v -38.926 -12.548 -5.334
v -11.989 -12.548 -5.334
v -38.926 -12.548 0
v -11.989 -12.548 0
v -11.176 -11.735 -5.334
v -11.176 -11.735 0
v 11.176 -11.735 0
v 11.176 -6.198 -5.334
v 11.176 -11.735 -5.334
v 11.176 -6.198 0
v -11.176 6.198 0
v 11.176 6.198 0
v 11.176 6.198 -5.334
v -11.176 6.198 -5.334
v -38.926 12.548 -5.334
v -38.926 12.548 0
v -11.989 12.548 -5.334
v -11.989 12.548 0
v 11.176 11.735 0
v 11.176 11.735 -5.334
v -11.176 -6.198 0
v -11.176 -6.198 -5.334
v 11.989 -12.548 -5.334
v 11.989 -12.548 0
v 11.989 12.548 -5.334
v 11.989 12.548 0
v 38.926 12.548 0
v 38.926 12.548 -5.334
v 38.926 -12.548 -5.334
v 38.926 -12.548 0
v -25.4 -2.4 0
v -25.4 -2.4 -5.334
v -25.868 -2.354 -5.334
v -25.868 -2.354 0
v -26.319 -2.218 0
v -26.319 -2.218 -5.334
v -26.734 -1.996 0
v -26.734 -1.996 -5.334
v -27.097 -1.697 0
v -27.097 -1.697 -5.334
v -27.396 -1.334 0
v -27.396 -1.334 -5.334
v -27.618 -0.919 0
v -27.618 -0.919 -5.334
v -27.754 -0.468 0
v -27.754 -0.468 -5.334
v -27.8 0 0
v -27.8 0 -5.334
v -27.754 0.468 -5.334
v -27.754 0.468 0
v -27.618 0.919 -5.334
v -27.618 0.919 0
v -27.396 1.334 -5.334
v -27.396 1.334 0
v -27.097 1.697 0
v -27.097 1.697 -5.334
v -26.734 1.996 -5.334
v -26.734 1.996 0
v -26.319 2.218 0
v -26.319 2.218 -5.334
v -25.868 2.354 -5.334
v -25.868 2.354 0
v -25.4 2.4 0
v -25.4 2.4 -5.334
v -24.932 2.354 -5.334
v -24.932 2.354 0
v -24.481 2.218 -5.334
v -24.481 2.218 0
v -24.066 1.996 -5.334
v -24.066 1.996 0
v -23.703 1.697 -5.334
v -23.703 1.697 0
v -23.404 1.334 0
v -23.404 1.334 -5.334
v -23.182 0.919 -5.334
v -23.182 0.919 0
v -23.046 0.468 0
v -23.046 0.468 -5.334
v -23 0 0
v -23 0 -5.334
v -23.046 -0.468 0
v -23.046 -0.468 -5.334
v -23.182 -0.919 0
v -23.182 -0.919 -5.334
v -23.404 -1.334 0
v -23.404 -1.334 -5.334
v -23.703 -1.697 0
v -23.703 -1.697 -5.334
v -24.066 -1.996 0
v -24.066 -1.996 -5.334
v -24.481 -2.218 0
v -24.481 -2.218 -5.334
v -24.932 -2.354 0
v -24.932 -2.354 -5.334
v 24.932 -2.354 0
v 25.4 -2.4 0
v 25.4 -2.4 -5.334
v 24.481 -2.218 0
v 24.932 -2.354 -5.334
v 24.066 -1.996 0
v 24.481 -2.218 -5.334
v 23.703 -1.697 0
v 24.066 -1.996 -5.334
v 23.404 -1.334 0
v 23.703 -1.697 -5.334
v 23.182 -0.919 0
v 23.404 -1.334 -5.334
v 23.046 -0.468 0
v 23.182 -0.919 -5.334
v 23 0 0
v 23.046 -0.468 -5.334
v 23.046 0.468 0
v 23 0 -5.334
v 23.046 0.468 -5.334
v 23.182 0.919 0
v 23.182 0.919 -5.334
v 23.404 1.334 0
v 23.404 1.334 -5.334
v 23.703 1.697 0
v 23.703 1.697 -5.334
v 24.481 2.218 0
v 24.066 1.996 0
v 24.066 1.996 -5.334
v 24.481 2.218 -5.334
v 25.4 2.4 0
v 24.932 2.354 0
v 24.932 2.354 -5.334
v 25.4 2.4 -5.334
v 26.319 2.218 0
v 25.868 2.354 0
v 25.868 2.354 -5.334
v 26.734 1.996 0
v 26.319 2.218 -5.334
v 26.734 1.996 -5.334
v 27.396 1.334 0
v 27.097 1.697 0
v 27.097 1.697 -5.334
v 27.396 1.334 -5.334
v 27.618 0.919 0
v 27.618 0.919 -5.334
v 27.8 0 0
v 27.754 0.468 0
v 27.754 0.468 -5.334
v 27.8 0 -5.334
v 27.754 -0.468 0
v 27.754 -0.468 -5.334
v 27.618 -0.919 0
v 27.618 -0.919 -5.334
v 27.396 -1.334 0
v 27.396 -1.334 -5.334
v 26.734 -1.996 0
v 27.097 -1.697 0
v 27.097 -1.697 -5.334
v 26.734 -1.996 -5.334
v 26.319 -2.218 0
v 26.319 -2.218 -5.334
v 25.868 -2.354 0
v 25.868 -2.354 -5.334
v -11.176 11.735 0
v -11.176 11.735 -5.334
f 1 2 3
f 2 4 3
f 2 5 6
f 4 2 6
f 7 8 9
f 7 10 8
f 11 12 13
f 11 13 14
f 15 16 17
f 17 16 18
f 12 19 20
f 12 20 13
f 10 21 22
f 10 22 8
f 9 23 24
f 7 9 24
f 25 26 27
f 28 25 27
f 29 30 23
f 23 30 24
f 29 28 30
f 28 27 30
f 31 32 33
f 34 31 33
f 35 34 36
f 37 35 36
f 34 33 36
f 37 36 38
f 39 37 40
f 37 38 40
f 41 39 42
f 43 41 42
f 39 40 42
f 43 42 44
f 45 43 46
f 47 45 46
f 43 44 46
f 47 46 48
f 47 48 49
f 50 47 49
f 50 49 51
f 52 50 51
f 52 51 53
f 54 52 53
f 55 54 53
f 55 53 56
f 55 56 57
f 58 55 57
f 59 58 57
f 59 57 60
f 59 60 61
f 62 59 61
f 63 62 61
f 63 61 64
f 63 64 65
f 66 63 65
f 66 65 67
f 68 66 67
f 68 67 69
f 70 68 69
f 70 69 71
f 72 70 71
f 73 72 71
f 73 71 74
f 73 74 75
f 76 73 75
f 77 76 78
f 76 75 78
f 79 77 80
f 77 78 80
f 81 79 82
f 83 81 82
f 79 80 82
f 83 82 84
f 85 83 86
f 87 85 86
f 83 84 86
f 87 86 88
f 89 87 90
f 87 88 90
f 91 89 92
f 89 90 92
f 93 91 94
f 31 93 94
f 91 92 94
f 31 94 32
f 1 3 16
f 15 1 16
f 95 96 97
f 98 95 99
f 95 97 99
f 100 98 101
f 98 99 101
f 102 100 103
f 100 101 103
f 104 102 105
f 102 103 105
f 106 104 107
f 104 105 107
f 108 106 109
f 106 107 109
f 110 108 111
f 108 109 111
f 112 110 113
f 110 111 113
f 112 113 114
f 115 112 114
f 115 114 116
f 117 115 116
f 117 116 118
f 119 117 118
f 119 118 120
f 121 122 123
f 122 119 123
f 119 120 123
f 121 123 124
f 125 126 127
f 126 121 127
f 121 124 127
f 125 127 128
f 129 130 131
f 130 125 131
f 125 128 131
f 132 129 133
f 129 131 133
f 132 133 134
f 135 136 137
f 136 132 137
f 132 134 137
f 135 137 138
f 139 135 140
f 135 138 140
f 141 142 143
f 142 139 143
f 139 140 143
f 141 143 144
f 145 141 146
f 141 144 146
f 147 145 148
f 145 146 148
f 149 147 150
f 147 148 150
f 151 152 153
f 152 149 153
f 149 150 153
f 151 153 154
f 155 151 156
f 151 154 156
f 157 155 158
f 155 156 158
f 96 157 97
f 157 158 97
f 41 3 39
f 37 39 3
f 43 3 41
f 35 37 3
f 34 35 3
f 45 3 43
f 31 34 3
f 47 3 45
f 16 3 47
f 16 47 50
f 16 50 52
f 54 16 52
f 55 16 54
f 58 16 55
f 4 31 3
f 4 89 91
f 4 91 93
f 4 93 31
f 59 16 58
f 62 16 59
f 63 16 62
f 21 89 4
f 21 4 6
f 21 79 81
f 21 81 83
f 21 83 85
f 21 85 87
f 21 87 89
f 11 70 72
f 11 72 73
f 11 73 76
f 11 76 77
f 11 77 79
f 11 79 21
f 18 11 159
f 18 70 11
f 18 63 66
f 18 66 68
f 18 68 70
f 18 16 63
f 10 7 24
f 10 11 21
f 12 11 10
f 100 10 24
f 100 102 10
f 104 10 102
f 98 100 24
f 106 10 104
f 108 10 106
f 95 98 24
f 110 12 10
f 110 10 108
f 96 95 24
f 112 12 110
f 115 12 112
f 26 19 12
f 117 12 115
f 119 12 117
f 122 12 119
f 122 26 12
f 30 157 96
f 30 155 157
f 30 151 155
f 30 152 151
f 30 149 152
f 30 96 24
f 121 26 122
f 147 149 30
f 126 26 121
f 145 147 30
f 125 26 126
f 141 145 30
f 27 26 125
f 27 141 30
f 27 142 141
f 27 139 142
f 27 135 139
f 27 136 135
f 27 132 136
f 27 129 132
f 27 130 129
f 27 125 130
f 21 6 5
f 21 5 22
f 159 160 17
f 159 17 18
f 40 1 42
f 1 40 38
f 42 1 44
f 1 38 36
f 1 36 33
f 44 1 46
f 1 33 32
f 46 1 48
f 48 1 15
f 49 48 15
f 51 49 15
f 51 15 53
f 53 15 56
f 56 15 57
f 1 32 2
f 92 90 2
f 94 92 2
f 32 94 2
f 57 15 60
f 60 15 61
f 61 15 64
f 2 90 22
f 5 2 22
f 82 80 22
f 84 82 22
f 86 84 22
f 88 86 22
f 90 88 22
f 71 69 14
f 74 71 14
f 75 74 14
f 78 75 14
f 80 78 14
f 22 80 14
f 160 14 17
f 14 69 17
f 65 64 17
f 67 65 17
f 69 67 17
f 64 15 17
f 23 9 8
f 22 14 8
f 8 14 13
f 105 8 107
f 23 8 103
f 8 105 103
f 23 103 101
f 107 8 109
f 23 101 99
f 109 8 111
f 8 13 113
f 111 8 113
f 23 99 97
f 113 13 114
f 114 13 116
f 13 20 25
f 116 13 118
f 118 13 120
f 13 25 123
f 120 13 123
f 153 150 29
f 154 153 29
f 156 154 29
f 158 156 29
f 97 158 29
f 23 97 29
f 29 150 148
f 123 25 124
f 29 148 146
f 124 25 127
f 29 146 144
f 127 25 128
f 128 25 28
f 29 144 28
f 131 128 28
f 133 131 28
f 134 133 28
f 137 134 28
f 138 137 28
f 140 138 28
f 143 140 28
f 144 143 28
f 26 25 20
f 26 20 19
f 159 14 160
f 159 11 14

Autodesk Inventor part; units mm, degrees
ref_plane "YZ Plane" through (0, 0, 0) normal (1, 0, 0) x (0, 1, 0)
ref_plane "XZ Plane" through (0, 0, 0) normal (0, 1, 0) x (-1, 0, 0)
ref_plane "XY Plane" through (0, 0, 0) normal (0, 0, 1) x (1, 0, 0)
sketch "Sketch1" plane through (0, 0, 0) normal (0, 0, 1) x (1, 0, 0)
  line L0 (-38.9255, 12.5476) -> (38.9255, 12.5476)
  line L1 (38.9255, 12.5476) -> (38.9255, -12.5476)
  line L2 (38.9255, -12.5476) -> (-38.9255, -12.5476)
  line L3 (-38.9255, -12.5476) -> (-38.9255, 12.5476)
  point P0 (0, 0)
  point P1 (38.9255, 0)
  point P2 (0, 12.5476)
  dimension "d0" = 77.851
  dimension "d1" = 25.0952
extrude "Extrusion1" add sketch "Sketch1" against normal blind 5.334
sketch "Sketch2" plane through (0, 0, 0) normal (0, 0, 1) x (1, 0, 0)
  line L0 (-38.9255, 12.5476) -> (38.9255, 12.5476) projected
  line L1 (38.9255, -12.5476) -> (-38.9255, -12.5476) projected
  line L2 (-11.176, -6.1976) -> (11.176, -6.1976)
  line L3 (11.176, -6.1976) -> (11.176, -12.5476)
  line L4 (11.176, -12.5476) -> (-11.176, -12.5476)
  line L5 (-11.176, -12.5476) -> (-11.176, -6.1976)
  point P0 (0, 0)
  point P1 (0, -6.1976)
  point P2 (0, 12.5476)
  dimension "d4" = 22.352
  dimension "d5" = 6.35
extrude "Extrusion2" cut sketch "Sketch2" against normal blind 25.4
mirror "Mirror1" about plane through (0, 0, 0) normal (0, 1, 0) of "Extrusion2"
sketch "Sketch3" plane through (0, 0, 0) normal (0, 0, 1) x (1, 0, 0)
  line L0 (-54.4957, 0) -> (54.4957, 0) projected
  line L1 (0, 17.5666) -> (0, -17.5666) projected
  point P0 (0, 0)
  point P1 (-25.4, 0)
  dimension "d8" = 25.4
hole "Hole1" at (-25.4, 0, 0) direction (0, 0, -1) diameter 4.8006 end through all
mirror "Mirror2" about plane through (0, 0, 0) normal (1, 0, 0) of "Hole1"
chamfer "Chamfer1" distance 0.8128 angle 45 4 edges at (11.176, 12.5476, -2.667) (-11.176, 12.5476, -2.667) (11.176, -12.5476, -2.667) (-11.176, -12.5476, -2.667)
properties material "ACRYLIC, CLEAR"
